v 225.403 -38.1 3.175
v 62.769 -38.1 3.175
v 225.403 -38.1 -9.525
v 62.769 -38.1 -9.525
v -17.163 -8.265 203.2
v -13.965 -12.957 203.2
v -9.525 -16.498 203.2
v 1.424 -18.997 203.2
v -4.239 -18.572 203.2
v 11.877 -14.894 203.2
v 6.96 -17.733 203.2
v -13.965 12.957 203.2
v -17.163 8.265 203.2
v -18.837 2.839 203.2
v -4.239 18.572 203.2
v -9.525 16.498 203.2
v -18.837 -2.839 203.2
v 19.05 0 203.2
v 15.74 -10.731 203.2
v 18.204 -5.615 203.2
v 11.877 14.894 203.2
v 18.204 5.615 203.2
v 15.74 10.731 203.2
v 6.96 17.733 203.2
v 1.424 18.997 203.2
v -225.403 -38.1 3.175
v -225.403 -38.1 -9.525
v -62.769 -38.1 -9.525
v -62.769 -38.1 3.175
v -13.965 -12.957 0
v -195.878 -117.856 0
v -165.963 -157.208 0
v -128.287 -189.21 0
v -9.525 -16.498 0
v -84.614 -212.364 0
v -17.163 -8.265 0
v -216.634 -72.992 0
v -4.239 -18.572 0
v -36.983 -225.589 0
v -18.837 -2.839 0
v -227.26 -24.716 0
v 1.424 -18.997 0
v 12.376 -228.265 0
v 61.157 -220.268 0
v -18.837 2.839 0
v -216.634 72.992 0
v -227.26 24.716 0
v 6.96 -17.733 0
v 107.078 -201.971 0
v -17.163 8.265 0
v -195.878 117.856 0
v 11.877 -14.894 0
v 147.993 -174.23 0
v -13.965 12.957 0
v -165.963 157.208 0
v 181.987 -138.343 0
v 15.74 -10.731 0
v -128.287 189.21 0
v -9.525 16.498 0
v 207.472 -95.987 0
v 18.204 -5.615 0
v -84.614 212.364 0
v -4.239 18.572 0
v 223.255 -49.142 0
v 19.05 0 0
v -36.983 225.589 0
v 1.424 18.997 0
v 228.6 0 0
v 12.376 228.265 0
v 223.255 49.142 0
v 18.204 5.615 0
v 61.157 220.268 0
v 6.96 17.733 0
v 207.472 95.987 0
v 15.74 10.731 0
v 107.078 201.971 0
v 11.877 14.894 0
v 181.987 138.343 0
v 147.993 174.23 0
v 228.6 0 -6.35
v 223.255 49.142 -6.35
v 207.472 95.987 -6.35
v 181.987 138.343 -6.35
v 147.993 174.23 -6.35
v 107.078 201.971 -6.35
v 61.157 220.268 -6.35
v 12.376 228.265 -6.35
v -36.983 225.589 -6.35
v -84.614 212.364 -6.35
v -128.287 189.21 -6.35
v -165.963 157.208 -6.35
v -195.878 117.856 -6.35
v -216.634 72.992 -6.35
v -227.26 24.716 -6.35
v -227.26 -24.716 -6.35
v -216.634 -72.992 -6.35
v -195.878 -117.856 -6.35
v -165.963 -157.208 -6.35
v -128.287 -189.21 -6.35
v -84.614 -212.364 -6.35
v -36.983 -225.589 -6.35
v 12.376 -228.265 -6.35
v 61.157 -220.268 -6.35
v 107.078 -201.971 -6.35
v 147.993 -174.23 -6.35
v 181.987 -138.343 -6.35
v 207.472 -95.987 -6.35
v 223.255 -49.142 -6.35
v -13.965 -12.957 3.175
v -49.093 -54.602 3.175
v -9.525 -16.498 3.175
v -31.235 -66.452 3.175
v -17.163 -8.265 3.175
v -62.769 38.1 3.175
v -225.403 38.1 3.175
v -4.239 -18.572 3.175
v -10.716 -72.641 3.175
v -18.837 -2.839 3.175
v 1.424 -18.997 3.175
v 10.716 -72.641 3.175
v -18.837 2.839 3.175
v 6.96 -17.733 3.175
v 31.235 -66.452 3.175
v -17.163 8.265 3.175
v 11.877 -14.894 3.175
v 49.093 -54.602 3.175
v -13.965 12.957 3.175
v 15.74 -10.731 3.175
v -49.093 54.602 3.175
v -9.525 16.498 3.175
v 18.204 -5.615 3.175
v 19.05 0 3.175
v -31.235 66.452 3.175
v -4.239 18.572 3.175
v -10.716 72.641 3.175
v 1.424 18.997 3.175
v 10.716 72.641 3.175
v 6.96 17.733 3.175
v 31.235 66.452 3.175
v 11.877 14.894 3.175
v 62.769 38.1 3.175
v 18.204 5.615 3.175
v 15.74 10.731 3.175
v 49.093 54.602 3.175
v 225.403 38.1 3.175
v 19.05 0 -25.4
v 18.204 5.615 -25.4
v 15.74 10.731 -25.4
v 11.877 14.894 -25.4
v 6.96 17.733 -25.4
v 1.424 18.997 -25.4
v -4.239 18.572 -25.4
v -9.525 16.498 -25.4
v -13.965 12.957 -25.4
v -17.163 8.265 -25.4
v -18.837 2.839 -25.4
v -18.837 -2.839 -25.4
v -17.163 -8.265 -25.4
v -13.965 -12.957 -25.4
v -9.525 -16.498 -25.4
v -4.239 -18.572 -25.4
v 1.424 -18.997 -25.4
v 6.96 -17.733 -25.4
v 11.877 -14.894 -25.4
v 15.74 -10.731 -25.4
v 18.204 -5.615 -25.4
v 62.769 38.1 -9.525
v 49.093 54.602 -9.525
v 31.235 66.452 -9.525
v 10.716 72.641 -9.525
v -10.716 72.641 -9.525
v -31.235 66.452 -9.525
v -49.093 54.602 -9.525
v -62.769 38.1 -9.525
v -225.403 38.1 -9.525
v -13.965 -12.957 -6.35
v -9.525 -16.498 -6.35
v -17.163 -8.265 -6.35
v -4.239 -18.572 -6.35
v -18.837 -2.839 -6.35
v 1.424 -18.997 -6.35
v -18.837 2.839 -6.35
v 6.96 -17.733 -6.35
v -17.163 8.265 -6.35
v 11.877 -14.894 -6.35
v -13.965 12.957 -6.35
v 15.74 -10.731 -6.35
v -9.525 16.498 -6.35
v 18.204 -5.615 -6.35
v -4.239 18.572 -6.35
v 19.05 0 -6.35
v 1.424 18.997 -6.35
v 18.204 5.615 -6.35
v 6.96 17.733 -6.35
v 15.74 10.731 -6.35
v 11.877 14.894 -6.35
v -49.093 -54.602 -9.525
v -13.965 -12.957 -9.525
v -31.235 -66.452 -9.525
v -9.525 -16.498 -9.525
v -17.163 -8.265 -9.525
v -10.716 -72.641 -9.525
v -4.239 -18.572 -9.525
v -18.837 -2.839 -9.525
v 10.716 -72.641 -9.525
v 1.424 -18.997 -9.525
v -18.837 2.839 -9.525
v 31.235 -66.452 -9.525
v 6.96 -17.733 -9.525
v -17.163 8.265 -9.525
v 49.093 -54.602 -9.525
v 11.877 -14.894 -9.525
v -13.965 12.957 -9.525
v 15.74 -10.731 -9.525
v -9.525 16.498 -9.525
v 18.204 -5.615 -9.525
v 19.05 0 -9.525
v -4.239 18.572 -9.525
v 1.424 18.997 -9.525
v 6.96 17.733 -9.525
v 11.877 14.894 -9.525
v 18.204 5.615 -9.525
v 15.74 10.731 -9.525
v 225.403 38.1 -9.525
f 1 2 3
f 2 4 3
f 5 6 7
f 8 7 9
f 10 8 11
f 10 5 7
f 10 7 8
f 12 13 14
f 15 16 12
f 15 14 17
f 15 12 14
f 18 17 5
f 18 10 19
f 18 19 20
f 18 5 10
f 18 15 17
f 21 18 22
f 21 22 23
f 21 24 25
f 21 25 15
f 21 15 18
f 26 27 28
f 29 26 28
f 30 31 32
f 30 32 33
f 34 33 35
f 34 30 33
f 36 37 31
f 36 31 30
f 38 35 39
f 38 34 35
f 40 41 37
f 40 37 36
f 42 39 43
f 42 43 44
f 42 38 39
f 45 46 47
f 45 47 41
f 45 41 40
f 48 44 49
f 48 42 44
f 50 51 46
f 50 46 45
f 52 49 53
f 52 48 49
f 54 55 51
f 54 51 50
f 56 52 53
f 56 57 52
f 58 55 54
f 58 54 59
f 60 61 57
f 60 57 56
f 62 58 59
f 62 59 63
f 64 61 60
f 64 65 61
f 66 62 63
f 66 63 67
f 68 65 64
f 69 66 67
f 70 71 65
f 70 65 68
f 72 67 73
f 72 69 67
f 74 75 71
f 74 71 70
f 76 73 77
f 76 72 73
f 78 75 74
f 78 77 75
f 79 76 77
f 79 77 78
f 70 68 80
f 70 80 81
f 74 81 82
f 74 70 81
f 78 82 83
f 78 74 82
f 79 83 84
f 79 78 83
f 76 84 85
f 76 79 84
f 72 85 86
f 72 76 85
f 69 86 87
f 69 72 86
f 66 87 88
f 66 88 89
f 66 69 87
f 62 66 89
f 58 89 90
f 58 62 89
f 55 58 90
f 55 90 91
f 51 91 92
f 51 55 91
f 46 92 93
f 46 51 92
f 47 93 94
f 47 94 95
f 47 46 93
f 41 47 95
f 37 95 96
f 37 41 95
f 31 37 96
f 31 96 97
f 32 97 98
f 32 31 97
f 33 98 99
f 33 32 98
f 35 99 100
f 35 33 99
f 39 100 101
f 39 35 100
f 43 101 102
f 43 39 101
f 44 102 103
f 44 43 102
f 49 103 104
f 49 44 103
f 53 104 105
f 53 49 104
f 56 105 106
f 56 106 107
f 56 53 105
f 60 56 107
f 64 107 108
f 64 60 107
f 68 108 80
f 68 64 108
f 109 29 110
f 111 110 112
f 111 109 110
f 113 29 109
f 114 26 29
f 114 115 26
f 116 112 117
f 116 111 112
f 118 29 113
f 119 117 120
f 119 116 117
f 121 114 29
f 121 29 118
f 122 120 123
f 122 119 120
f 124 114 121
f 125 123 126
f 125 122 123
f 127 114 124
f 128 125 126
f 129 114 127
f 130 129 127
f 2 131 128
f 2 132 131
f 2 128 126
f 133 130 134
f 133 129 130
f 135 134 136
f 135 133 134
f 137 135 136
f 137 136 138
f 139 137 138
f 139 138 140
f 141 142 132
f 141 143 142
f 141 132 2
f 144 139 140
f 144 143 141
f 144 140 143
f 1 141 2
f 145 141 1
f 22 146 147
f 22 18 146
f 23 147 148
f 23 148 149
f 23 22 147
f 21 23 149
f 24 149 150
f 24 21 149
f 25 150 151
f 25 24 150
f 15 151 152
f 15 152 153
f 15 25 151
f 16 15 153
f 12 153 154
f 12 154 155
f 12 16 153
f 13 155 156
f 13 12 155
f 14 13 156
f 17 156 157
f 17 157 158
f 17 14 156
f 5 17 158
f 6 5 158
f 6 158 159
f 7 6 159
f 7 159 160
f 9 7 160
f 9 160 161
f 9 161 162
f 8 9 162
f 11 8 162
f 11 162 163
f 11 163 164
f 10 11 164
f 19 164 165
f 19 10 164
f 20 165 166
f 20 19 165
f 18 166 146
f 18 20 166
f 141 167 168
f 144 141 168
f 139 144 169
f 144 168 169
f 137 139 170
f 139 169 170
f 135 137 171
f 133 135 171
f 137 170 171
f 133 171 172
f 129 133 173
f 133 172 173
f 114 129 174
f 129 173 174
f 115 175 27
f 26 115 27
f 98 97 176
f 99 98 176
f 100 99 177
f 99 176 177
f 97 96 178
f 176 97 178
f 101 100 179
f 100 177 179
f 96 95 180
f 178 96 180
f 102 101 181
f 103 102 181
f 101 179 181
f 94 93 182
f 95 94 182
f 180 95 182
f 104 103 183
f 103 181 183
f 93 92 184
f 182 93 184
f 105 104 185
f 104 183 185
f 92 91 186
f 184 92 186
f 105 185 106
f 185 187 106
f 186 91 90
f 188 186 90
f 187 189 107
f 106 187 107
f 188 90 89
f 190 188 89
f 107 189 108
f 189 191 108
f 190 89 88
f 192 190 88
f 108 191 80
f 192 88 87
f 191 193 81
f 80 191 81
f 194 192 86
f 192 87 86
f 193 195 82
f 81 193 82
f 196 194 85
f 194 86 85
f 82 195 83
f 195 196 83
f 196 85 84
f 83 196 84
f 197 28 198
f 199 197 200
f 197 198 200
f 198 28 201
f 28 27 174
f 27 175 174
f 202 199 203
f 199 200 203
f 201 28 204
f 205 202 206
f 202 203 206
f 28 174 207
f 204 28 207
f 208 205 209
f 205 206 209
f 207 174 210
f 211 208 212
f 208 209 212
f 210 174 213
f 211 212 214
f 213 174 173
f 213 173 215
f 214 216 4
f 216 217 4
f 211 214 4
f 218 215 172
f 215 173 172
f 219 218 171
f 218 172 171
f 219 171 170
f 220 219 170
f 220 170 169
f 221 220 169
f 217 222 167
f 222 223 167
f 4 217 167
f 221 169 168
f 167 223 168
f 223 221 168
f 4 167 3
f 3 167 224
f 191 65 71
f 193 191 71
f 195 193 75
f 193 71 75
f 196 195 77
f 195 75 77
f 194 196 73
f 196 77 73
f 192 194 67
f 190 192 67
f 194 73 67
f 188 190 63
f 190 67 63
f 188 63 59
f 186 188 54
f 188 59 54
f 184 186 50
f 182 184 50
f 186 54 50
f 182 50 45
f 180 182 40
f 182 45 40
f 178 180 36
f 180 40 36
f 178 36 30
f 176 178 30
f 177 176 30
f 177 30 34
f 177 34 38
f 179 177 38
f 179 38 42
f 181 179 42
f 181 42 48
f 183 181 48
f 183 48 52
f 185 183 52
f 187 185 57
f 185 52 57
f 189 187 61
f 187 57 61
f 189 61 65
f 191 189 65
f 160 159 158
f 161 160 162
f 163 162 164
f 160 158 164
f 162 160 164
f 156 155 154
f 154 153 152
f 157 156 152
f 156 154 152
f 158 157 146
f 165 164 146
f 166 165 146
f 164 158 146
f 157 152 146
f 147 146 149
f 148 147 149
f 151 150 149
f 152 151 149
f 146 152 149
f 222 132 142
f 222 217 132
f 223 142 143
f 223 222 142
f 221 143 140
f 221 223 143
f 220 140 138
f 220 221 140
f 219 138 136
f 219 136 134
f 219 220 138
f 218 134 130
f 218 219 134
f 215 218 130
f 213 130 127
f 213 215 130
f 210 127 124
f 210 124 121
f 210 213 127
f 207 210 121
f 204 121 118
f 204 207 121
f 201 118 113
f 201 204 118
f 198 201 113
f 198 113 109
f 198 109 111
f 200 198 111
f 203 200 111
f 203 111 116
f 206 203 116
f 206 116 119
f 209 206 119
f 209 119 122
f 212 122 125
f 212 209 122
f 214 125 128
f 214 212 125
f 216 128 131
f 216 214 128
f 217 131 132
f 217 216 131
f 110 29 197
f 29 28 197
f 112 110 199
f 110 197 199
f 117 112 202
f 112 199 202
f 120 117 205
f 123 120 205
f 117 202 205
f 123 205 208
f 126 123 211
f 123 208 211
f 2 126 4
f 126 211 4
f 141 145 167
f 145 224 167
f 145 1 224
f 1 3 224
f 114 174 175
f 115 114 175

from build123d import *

# Parameters (mm, degrees)
F0_R          = 228.6
F0_R_2        = 19.05
F1_DEPTH      = 6.35
F2_DEPTH      = 203.2
F2_DEPTH_BACK = 25.4
F3_R          = 19.05
F4_DEPTH      = 9.525
F4_DEPTH_BACK = 3.175


with BuildPart() as f1:
    # F0 (on Top) → F1 (new body)
    with BuildSketch(Plane.XY):
        Circle(F0_R)
        Circle(F0_R_2, mode=Mode.SUBTRACT)
    extrude(amount=-F1_DEPTH)


with BuildPart() as f2:
    # F0 (on Top) → F2 (new body, two sides)
    with BuildSketch(Plane.XY) as f2_sk:
        Circle(F0_R_2)
    extrude(amount=F2_DEPTH)
    extrude(f2_sk.sketch, amount=-F2_DEPTH_BACK)


with BuildPart() as f4:
    # F3 (on face) → F4 (new body, two sides)
    with BuildSketch(Plane.XY) as f4_sk:
        with BuildLine():
            Line((-225.4026397361, -38.1), (-62.7689518813, -38.1))
            ThreePointArc((-62.7689518813, -38.1), (0, -73.4271837964), (62.7689518813, -38.1))
            Line((62.7689518813, -38.1), (225.4026397361, -38.1))
            Line((225.4026397361, -38.1), (225.4026397361, 38.1))
            Line((225.4026397361, 38.1), (62.7689518813, 38.1))
            ThreePointArc((62.7689518813, 38.1), (0, 73.4271837964), (-62.7689518813, 38.1))
            Line((-62.7689518813, 38.1), (-225.4026397361, 38.1))
            Line((-225.4026397361, 38.1), (-225.4026397361, -38.1))
        make_face()
        Circle(F3_R, mode=Mode.SUBTRACT)
    extrude(amount=-F4_DEPTH)
    extrude(f4_sk.sketch, amount=F4_DEPTH_BACK)


solid = Compound([f1.part, f2.part, f4.part])
